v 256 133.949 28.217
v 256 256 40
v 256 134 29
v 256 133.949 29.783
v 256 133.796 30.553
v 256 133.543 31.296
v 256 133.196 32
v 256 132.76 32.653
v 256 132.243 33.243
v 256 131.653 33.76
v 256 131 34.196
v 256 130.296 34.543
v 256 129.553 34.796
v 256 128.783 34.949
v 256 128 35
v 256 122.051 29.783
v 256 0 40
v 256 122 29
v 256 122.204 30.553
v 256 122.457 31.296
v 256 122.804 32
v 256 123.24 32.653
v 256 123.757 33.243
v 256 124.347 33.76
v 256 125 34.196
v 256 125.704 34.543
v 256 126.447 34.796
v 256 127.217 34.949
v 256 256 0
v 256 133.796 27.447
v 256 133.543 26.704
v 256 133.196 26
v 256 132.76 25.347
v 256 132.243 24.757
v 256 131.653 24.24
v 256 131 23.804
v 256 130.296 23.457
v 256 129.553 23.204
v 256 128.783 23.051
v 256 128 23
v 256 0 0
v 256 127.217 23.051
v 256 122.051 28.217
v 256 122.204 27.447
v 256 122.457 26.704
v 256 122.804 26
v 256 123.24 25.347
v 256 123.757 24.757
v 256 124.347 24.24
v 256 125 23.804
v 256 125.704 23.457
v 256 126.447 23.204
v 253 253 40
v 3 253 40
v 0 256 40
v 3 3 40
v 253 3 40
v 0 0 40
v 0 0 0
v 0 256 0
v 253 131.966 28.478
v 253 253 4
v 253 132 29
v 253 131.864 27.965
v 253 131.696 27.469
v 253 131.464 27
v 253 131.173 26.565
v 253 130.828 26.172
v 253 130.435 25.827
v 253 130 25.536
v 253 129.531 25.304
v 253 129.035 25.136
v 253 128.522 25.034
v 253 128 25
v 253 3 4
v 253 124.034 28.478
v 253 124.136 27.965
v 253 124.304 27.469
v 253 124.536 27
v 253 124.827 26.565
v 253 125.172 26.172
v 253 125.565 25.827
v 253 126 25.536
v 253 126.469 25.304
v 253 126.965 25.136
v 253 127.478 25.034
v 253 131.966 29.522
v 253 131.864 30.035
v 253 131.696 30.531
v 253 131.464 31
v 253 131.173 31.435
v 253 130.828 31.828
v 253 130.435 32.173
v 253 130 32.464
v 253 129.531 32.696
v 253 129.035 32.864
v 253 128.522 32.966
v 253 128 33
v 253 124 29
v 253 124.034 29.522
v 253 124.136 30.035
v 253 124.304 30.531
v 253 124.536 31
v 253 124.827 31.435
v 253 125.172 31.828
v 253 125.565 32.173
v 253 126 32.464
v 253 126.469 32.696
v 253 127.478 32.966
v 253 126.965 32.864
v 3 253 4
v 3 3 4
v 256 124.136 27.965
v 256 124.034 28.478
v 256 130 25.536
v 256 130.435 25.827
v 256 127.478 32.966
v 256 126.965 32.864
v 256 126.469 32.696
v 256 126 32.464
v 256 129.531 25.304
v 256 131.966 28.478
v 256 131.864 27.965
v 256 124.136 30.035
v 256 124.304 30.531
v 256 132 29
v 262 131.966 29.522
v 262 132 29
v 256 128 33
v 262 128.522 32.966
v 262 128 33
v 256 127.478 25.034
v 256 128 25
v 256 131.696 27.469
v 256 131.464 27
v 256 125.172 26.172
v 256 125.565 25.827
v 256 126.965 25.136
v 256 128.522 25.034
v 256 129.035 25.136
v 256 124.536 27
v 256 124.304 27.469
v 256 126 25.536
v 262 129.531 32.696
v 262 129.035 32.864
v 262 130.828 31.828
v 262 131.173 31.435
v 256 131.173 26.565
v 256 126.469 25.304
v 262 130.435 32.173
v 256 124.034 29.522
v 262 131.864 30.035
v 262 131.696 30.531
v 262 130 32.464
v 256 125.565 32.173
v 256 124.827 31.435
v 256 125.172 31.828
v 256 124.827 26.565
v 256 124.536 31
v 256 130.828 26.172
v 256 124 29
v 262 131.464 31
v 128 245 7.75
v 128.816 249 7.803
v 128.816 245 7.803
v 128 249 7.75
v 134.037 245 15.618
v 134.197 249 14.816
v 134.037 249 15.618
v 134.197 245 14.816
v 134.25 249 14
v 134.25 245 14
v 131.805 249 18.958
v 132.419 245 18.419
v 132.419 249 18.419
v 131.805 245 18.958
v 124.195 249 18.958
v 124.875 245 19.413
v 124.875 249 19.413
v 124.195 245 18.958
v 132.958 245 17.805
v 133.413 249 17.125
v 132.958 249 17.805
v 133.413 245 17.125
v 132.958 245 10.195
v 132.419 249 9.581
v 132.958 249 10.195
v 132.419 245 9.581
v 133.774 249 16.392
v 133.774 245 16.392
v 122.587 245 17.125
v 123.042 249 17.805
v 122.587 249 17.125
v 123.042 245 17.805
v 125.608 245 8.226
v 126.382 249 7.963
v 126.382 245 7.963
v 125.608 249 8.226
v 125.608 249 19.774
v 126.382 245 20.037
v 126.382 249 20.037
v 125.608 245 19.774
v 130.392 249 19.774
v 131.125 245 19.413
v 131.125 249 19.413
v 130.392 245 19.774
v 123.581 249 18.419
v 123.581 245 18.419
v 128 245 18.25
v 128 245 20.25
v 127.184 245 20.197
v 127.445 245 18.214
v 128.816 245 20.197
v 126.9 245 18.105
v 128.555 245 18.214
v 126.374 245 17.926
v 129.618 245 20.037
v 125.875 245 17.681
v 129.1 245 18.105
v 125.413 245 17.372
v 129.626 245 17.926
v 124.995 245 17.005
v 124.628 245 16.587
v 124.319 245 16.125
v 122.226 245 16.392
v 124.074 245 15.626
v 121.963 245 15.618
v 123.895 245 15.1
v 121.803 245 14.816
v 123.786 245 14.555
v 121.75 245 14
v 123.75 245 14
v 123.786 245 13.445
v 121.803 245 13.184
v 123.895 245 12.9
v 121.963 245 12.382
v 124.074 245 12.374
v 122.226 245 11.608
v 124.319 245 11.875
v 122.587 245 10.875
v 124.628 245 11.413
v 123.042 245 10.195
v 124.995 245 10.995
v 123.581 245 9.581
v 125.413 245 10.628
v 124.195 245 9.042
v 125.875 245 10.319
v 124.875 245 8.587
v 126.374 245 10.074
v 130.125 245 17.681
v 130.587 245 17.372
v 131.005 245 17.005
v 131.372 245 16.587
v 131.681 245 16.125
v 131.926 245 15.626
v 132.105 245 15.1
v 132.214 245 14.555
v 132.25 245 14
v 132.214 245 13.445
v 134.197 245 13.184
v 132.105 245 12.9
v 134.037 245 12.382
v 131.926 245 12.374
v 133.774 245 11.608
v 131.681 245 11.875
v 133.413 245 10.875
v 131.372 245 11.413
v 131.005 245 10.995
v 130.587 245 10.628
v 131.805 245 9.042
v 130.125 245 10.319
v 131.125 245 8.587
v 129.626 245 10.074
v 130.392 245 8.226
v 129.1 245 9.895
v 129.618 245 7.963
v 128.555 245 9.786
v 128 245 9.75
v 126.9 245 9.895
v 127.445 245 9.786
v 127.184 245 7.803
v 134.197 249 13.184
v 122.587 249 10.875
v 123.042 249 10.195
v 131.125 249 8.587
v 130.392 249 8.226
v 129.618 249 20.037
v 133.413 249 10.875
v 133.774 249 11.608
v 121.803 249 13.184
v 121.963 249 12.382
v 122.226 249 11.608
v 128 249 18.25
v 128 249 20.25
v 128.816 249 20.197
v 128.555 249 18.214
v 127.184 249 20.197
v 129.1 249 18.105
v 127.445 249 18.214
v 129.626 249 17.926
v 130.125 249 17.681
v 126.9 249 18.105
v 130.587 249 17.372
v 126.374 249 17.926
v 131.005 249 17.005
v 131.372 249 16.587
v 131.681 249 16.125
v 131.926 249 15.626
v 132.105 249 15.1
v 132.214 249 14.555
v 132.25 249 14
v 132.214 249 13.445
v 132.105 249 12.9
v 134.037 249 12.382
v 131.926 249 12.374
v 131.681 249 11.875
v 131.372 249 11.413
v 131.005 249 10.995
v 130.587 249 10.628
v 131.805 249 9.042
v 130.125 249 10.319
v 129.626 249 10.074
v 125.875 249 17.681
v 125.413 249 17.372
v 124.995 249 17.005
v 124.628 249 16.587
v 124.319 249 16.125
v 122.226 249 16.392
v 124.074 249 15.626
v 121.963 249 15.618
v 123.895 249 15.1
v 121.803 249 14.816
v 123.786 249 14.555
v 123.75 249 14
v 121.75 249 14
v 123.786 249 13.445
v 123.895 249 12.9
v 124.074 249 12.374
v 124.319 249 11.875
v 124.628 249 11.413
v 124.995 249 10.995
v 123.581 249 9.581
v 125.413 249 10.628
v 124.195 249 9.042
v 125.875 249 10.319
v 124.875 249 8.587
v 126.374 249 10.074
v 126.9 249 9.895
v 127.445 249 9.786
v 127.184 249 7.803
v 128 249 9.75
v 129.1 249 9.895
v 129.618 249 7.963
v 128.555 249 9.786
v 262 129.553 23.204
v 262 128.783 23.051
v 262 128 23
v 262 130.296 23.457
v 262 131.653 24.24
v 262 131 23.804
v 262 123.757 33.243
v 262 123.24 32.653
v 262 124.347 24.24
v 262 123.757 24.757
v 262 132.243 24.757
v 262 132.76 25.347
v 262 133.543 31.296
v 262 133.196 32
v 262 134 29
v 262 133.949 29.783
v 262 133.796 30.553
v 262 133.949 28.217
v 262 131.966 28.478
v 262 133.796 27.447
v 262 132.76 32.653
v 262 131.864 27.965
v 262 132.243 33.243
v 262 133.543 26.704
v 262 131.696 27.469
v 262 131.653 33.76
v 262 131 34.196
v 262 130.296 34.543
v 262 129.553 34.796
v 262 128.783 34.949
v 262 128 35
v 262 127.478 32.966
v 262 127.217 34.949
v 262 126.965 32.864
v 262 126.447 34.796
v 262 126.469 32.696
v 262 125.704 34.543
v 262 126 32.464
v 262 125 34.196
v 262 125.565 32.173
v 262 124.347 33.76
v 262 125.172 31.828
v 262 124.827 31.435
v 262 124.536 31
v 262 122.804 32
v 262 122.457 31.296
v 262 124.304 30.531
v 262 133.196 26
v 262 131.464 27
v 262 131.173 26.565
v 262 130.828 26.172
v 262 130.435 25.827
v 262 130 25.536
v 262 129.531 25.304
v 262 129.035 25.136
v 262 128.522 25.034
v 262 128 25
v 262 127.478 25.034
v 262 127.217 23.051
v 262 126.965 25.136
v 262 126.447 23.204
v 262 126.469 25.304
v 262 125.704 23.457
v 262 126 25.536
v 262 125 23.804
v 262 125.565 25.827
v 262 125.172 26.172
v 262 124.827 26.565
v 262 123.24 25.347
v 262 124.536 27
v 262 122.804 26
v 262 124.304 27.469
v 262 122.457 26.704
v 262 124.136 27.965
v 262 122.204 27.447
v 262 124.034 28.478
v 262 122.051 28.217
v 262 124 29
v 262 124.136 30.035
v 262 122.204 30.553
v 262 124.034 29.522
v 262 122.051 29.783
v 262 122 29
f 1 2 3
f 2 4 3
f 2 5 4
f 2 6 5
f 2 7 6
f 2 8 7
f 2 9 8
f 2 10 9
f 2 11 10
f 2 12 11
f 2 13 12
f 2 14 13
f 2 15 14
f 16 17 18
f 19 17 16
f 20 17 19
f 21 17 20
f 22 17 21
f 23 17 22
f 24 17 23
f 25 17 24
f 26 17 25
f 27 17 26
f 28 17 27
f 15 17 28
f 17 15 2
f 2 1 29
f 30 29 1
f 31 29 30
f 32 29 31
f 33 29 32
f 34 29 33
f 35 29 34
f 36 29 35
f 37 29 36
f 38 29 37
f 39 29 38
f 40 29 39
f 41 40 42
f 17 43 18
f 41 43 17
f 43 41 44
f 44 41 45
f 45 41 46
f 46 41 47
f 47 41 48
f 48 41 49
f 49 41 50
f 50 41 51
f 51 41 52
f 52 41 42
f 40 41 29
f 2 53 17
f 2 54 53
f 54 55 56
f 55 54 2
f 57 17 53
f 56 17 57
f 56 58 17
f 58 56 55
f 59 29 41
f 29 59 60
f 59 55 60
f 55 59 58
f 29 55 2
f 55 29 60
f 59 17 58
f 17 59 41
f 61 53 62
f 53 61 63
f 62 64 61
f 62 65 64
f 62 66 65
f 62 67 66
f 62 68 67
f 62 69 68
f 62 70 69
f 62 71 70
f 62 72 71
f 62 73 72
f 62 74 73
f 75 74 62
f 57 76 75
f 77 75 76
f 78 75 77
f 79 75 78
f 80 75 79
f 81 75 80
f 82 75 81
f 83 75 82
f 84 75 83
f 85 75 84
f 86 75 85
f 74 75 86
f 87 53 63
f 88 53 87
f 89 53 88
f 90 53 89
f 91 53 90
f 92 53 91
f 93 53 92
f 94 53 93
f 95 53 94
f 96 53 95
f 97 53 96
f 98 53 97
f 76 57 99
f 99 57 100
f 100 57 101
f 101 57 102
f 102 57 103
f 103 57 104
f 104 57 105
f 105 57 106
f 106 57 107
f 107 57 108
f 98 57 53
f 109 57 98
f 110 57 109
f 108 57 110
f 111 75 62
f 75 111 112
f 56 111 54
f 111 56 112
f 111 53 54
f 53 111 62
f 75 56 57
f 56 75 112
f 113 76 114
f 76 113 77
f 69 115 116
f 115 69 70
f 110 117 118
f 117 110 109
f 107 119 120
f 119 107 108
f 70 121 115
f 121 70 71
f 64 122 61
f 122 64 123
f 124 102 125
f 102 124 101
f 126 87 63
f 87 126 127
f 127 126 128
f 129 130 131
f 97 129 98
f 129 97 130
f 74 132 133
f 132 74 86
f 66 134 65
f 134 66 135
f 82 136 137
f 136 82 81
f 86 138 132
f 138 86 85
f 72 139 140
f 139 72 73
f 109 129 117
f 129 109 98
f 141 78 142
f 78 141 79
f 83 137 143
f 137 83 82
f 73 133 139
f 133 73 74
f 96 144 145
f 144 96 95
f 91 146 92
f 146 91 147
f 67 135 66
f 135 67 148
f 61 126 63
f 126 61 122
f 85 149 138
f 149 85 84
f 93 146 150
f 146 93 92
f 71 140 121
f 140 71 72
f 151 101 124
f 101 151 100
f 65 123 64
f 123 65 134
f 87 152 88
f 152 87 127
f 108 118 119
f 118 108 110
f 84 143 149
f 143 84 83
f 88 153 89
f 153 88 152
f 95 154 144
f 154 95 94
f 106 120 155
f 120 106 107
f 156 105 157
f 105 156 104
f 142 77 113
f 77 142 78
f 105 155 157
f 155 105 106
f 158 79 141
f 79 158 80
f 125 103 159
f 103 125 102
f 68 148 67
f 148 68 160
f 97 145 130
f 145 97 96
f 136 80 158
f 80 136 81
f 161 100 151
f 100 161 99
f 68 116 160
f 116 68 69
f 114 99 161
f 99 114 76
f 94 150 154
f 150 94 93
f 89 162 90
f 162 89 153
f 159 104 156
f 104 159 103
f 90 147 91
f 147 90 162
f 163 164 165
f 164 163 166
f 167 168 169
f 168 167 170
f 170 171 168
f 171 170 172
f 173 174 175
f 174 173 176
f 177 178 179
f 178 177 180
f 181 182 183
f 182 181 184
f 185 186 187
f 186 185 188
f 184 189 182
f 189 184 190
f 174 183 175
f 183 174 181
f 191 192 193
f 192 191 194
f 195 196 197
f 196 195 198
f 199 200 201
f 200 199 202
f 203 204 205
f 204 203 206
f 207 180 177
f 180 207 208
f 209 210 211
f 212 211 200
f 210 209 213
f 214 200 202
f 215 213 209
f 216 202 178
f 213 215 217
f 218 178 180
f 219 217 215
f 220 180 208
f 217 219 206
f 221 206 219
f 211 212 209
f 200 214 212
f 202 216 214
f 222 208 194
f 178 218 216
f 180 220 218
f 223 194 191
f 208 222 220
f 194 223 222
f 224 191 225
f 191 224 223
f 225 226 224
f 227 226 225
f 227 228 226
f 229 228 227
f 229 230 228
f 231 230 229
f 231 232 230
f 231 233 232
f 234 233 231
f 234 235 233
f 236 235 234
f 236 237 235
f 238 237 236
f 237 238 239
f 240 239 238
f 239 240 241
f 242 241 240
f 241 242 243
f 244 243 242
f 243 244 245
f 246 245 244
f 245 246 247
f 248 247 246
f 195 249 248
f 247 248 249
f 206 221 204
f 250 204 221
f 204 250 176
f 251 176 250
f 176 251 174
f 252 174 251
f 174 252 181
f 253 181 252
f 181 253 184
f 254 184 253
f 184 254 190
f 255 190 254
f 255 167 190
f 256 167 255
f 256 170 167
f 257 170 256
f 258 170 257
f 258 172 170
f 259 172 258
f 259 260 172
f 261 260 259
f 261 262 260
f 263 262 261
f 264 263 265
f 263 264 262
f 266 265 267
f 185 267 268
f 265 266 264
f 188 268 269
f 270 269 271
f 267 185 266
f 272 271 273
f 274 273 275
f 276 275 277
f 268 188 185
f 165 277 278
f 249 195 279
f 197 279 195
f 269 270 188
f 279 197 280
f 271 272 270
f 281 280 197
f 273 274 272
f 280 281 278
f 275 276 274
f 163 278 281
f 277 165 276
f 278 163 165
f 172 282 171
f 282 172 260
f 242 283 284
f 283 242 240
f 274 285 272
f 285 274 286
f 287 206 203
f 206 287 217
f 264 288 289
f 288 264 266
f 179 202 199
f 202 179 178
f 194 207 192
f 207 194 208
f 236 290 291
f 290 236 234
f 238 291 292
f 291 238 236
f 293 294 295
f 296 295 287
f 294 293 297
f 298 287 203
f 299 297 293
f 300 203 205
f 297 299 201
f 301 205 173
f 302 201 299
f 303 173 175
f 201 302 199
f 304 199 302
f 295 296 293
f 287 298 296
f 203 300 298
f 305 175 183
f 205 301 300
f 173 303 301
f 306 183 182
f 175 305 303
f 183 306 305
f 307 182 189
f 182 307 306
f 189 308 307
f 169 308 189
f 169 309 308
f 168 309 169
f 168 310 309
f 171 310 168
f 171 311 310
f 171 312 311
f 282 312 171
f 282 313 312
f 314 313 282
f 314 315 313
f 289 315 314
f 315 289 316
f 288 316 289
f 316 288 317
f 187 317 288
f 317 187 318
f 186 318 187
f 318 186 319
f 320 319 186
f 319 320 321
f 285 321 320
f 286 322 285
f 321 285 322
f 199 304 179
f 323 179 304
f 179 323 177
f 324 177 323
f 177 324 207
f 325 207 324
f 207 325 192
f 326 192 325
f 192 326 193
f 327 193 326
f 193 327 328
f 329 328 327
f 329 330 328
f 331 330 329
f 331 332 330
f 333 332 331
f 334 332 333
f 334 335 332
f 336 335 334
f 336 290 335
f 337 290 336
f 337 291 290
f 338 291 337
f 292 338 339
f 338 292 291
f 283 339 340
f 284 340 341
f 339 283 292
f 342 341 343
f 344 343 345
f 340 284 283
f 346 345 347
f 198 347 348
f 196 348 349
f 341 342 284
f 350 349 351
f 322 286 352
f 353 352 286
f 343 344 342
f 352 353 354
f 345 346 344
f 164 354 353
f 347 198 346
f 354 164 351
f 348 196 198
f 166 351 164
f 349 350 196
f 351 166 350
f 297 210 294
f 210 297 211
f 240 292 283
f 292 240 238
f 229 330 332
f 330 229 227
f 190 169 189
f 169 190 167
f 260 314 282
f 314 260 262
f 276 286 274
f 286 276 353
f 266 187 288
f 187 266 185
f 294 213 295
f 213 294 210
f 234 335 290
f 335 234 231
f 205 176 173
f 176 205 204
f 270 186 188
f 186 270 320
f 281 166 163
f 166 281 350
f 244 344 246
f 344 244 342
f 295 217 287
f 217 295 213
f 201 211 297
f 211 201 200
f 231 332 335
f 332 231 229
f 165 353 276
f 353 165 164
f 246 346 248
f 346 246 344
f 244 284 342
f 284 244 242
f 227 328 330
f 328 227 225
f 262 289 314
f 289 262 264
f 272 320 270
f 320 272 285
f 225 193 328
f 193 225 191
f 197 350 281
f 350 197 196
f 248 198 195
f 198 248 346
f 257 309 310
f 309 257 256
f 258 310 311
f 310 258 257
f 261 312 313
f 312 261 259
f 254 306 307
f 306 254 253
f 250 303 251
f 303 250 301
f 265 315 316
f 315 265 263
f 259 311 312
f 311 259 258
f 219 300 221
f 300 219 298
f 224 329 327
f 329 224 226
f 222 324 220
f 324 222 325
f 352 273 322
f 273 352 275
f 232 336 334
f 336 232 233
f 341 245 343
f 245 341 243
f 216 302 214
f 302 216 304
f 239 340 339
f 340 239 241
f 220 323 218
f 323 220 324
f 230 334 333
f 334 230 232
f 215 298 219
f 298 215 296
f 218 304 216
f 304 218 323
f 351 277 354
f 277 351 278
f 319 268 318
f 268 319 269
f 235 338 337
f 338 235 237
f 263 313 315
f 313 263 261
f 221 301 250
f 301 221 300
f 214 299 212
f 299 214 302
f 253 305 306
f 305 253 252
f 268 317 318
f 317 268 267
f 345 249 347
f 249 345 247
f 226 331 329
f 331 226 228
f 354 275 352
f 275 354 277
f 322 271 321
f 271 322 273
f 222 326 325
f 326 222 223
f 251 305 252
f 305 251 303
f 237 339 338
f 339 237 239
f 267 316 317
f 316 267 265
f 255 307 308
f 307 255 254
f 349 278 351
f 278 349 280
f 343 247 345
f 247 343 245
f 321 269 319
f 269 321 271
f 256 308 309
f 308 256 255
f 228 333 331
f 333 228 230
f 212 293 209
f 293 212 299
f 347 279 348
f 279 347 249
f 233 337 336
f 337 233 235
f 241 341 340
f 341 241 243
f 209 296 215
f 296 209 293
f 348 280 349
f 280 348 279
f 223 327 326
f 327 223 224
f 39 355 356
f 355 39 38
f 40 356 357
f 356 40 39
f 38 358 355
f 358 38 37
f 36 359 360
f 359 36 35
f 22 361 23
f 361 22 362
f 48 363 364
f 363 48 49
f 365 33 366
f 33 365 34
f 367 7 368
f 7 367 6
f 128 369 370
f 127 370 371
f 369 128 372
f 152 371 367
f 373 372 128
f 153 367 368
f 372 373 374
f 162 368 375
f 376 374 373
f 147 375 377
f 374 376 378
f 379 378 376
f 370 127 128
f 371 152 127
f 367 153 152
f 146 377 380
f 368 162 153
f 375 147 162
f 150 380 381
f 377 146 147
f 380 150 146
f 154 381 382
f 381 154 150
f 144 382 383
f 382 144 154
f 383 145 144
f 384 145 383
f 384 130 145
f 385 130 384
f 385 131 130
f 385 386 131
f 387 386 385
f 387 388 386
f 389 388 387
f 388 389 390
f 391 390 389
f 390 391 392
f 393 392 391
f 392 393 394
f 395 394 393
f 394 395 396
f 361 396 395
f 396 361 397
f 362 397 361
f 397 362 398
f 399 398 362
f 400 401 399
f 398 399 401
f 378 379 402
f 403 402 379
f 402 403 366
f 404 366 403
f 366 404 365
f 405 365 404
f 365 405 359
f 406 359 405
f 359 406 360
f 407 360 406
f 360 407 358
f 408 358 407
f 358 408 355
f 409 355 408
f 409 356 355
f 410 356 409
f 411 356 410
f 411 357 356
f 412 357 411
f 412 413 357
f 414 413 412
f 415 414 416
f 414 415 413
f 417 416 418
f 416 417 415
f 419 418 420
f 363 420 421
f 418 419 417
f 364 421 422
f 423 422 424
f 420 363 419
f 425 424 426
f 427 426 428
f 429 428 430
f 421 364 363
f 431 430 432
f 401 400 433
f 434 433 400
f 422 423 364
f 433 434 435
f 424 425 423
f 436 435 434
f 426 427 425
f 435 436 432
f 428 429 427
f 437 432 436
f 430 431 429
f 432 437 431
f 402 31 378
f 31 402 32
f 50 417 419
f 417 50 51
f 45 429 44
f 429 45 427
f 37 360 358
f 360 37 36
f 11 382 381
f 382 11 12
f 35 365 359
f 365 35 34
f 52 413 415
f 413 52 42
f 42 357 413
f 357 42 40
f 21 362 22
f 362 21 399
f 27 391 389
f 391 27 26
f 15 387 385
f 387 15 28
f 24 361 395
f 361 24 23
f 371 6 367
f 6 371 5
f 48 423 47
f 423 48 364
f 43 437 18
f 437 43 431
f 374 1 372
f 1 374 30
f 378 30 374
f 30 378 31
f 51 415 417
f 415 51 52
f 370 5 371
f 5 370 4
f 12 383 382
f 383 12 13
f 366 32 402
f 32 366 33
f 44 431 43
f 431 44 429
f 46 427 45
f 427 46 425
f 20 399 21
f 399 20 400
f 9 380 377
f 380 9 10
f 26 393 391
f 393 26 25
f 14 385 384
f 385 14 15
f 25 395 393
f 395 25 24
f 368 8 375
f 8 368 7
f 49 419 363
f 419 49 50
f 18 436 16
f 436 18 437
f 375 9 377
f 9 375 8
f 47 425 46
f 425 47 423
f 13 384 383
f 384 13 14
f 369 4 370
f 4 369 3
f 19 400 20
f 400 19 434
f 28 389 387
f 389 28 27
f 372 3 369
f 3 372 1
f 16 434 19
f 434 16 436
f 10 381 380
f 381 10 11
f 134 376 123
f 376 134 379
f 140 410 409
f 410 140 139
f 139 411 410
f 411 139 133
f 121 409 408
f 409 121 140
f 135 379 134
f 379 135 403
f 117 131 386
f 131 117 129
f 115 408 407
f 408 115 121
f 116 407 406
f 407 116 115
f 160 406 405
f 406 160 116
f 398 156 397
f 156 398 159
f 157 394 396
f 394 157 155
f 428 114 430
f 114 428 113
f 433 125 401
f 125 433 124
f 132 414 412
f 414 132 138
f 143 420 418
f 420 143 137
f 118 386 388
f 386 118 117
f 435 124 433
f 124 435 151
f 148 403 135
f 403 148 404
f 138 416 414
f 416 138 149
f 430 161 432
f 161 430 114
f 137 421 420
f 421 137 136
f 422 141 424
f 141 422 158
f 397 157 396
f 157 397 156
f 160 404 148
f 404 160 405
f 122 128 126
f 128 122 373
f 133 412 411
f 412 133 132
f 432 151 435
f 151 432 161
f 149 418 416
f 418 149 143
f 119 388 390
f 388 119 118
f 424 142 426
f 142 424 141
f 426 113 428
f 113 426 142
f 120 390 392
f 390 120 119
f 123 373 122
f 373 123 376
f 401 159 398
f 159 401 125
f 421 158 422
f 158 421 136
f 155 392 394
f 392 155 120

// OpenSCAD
// ============================================================
// Sub-Tray  (sub_tray.stl)
// ============================================================
// Outer: 256×256×40mm  (sits below growing tray, catches drain water)
// Sealed base with:
//   - Overflow port: Ø8mm on right wall (X=sub_w), Z=25mm — routes to waste
//   - Drain fitting: Ø8.5mm on rear wall (Y=sub_d), Z=10mm — waste tube
//
// Print orientation: upside-down (open top on bed).
//   Footprint: 256×256mm. Minimum bed: 256mm in both axes.
//   NOTE: 200mm bed insufficient; 256mm minimum required.
//   Alternative: print in 2 halves at X=128mm.
//
// CRITICAL post-process: coat all interior surfaces with XTC-3D
//   epoxy (2 coats) or 3–4 coats Rustoleum Crystal Clear.
//   Test: fill with water, leave 24h, check for weeping. (Q-008)
//
// Material: PETG, 40% infill, 4 perimeters, 6 top/bottom layers.
// ============================================================

include <params.scad>

module sub_tray() {
    difference() {

        // --- Outer sealed body ---
        cube([sub_w, sub_d, sub_h]);

        // --- Interior void (open top) ---
        translate([sub_wall, sub_wall, sub_floor])
            cube([sub_w - 2*sub_wall,
                  sub_d - 2*sub_wall,
                  sub_h - sub_floor + eps]);

        // --- Overflow port: right wall (X=sub_w face) ---
        // At Z=overflow_z (25mm above sub floor interior = sub_floor + 25mm)
        translate([sub_w - sub_wall - eps,
                   sub_w / 2,
                   sub_floor + overflow_z])
            rotate([0, 90, 0])
                cylinder(d=overflow_d, h=sub_wall + 2*eps);

        // --- Drain fitting port: rear wall (Y=sub_d face) ---
        // At Z=10mm (above floor), for push-fit 6mm OD waste tube
        translate([sub_w / 2,
                   sub_d - sub_wall - eps,
                   sub_floor + 10])
            rotate([90, 0, 0])
                cylinder(d=drain_fit_d, h=sub_wall + 2*eps);

    } // end difference

    // --- Drain fitting barb (inside wall, push-fit collar) ---
    // Retains the silicone waste tube on the inside face
    translate([sub_w / 2,
               sub_d - sub_wall - 4,
               sub_floor + 10])
        rotate([90, 0, 0])
            difference() {
                cylinder(d=drain_fit_d + 4, h=4);
                cylinder(d=drain_fit_d,     h=4 + eps);
            }

    // --- Overflow port barb (outside face, for waste tube) ---
    translate([sub_w,
               sub_w / 2,
               sub_floor + overflow_z])
        rotate([0, 90, 0])
            difference() {
                cylinder(d=overflow_d + 4, h=6);
                cylinder(d=overflow_d,     h=6 + eps);
            }
}

sub_tray();
